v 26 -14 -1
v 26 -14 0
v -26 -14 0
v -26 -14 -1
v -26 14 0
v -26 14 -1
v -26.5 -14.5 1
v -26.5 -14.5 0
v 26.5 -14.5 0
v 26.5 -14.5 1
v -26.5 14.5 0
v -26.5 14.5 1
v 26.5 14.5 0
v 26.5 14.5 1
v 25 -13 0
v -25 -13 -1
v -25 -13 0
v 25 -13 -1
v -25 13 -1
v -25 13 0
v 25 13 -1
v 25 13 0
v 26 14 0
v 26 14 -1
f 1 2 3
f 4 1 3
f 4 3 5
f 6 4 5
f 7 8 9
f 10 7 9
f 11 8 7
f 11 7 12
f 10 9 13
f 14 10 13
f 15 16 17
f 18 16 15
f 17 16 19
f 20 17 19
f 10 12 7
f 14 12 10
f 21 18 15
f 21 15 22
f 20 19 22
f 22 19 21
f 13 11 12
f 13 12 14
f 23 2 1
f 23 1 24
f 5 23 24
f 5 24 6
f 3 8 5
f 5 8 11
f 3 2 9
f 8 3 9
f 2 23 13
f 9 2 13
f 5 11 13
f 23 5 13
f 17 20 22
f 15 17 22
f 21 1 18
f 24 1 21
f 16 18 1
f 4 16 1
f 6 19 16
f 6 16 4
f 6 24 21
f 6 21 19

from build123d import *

# Parameters (mm, degrees)
SKETCH1_W           = 53
SKETCH1_H           = 29
BOSS_EXTRUDE1_DEPTH = 1
SKETCH2_W           = 52
SKETCH2_H           = 28
BOSS_EXTRUDE2_DEPTH = 1
SHELL1_START        = -1
SHELL1_OUTLINE_W    = 50
SHELL1_OUTLINE_H    = 26
SHELL1_DEPTH        = 1


# Read off the part's stored shape, not the designer's step: Shell1
with BuildPart() as part:
    # Sketch1 → Boss-Extrude1 (new body)
    with BuildSketch(Plane.XY):
        Rectangle(SKETCH1_W, SKETCH1_H)
    extrude(amount=BOSS_EXTRUDE1_DEPTH)

    # Sketch2 → Boss-Extrude2 (add)
    with BuildSketch(Plane(origin=(0, 0, 0), x_dir=(-1, 0, 0), z_dir=(0, 0, -1))):
        Rectangle(SKETCH2_W, SKETCH2_H)
    extrude(amount=BOSS_EXTRUDE2_DEPTH)

    # Shell1 outline → Shell1 (cut)
    with BuildSketch(Plane.XY.offset(SHELL1_START)):
        Rectangle(SHELL1_OUTLINE_W, SHELL1_OUTLINE_H)
    extrude(amount=SHELL1_DEPTH, mode=Mode.SUBTRACT)


solid = part.part
